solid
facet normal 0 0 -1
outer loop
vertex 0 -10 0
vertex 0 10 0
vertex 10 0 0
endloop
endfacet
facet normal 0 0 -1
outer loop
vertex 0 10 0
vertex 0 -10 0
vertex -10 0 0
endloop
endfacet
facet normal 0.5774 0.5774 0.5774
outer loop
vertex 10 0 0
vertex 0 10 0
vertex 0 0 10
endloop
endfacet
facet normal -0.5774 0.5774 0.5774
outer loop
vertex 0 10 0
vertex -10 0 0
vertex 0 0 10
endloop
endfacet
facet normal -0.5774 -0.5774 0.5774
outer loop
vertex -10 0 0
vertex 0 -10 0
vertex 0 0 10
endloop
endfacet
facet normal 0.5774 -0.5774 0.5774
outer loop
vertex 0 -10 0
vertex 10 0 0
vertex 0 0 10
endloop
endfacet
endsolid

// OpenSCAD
echo(version=version());

polyhedron(
  points = [
    [10, 0, 0],
    [0, 10, 0],
    [-10, 0, 0],
    [0, -10, 0],
    [0, 0, 10]
  ],
  faces = [
    [0, 1, 2, 3],
    [4, 1, 0],
    [4, 2, 1],
    [4, 3, 2],
    [4, 0, 3]
  ]
);

// Written by Clifford Wolf <clifford@clifford.at> and Marius
// Kintel <marius@kintel.net>
//
// To the extent possible under law, the author(s) have dedicated all
// copyright and related and neighboring rights to this software to the
// public domain worldwide. This software is distributed without any
// warranty.
//
// You should have received a copy of the CC0 Public Domain
// Dedication along with this software.
// If not, see <http://creativecommons.org/publicdomain/zero/1.0/>.
